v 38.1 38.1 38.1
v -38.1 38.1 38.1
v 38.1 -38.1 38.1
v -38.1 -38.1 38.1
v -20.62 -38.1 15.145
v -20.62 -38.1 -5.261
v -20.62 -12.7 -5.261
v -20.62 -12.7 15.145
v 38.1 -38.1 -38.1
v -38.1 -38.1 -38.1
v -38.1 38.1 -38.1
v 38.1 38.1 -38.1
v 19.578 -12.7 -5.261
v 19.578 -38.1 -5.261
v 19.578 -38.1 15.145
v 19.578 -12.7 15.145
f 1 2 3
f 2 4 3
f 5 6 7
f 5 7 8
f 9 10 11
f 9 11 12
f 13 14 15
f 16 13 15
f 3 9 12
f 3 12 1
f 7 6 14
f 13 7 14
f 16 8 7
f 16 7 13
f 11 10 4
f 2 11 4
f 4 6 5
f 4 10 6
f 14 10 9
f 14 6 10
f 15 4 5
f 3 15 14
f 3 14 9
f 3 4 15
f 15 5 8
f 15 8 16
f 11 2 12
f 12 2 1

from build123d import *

# Parameters (mm, degrees)
F1_W     = 76.2
F1_H     = 76.2
F2_DEPTH = 38.1
F3_W     = 40.1978772134
F3_H     = 20.4053004272
F4_DEPTH = 25.4


# Not quite as in the source:
# - a variable given as a bare number and used for a length is read in inches; the dataset says mm whatever the document's units were


with BuildPart() as f2:
    # F1 (on Front) → F2 (new body, symmetric)
    with BuildSketch(Plane.XZ):
        Rectangle(F1_W, F1_H)
    extrude(amount=F2_DEPTH, both=True)

    # F3 (on face) → F4 (cut)
    with BuildSketch(Plane.XZ.offset(38.1)):
        with Locations((-0.5212100223, 4.9419447314)):
            Rectangle(F3_W, F3_H)
    extrude(amount=-F4_DEPTH, mode=Mode.SUBTRACT)


solid = f2.part
